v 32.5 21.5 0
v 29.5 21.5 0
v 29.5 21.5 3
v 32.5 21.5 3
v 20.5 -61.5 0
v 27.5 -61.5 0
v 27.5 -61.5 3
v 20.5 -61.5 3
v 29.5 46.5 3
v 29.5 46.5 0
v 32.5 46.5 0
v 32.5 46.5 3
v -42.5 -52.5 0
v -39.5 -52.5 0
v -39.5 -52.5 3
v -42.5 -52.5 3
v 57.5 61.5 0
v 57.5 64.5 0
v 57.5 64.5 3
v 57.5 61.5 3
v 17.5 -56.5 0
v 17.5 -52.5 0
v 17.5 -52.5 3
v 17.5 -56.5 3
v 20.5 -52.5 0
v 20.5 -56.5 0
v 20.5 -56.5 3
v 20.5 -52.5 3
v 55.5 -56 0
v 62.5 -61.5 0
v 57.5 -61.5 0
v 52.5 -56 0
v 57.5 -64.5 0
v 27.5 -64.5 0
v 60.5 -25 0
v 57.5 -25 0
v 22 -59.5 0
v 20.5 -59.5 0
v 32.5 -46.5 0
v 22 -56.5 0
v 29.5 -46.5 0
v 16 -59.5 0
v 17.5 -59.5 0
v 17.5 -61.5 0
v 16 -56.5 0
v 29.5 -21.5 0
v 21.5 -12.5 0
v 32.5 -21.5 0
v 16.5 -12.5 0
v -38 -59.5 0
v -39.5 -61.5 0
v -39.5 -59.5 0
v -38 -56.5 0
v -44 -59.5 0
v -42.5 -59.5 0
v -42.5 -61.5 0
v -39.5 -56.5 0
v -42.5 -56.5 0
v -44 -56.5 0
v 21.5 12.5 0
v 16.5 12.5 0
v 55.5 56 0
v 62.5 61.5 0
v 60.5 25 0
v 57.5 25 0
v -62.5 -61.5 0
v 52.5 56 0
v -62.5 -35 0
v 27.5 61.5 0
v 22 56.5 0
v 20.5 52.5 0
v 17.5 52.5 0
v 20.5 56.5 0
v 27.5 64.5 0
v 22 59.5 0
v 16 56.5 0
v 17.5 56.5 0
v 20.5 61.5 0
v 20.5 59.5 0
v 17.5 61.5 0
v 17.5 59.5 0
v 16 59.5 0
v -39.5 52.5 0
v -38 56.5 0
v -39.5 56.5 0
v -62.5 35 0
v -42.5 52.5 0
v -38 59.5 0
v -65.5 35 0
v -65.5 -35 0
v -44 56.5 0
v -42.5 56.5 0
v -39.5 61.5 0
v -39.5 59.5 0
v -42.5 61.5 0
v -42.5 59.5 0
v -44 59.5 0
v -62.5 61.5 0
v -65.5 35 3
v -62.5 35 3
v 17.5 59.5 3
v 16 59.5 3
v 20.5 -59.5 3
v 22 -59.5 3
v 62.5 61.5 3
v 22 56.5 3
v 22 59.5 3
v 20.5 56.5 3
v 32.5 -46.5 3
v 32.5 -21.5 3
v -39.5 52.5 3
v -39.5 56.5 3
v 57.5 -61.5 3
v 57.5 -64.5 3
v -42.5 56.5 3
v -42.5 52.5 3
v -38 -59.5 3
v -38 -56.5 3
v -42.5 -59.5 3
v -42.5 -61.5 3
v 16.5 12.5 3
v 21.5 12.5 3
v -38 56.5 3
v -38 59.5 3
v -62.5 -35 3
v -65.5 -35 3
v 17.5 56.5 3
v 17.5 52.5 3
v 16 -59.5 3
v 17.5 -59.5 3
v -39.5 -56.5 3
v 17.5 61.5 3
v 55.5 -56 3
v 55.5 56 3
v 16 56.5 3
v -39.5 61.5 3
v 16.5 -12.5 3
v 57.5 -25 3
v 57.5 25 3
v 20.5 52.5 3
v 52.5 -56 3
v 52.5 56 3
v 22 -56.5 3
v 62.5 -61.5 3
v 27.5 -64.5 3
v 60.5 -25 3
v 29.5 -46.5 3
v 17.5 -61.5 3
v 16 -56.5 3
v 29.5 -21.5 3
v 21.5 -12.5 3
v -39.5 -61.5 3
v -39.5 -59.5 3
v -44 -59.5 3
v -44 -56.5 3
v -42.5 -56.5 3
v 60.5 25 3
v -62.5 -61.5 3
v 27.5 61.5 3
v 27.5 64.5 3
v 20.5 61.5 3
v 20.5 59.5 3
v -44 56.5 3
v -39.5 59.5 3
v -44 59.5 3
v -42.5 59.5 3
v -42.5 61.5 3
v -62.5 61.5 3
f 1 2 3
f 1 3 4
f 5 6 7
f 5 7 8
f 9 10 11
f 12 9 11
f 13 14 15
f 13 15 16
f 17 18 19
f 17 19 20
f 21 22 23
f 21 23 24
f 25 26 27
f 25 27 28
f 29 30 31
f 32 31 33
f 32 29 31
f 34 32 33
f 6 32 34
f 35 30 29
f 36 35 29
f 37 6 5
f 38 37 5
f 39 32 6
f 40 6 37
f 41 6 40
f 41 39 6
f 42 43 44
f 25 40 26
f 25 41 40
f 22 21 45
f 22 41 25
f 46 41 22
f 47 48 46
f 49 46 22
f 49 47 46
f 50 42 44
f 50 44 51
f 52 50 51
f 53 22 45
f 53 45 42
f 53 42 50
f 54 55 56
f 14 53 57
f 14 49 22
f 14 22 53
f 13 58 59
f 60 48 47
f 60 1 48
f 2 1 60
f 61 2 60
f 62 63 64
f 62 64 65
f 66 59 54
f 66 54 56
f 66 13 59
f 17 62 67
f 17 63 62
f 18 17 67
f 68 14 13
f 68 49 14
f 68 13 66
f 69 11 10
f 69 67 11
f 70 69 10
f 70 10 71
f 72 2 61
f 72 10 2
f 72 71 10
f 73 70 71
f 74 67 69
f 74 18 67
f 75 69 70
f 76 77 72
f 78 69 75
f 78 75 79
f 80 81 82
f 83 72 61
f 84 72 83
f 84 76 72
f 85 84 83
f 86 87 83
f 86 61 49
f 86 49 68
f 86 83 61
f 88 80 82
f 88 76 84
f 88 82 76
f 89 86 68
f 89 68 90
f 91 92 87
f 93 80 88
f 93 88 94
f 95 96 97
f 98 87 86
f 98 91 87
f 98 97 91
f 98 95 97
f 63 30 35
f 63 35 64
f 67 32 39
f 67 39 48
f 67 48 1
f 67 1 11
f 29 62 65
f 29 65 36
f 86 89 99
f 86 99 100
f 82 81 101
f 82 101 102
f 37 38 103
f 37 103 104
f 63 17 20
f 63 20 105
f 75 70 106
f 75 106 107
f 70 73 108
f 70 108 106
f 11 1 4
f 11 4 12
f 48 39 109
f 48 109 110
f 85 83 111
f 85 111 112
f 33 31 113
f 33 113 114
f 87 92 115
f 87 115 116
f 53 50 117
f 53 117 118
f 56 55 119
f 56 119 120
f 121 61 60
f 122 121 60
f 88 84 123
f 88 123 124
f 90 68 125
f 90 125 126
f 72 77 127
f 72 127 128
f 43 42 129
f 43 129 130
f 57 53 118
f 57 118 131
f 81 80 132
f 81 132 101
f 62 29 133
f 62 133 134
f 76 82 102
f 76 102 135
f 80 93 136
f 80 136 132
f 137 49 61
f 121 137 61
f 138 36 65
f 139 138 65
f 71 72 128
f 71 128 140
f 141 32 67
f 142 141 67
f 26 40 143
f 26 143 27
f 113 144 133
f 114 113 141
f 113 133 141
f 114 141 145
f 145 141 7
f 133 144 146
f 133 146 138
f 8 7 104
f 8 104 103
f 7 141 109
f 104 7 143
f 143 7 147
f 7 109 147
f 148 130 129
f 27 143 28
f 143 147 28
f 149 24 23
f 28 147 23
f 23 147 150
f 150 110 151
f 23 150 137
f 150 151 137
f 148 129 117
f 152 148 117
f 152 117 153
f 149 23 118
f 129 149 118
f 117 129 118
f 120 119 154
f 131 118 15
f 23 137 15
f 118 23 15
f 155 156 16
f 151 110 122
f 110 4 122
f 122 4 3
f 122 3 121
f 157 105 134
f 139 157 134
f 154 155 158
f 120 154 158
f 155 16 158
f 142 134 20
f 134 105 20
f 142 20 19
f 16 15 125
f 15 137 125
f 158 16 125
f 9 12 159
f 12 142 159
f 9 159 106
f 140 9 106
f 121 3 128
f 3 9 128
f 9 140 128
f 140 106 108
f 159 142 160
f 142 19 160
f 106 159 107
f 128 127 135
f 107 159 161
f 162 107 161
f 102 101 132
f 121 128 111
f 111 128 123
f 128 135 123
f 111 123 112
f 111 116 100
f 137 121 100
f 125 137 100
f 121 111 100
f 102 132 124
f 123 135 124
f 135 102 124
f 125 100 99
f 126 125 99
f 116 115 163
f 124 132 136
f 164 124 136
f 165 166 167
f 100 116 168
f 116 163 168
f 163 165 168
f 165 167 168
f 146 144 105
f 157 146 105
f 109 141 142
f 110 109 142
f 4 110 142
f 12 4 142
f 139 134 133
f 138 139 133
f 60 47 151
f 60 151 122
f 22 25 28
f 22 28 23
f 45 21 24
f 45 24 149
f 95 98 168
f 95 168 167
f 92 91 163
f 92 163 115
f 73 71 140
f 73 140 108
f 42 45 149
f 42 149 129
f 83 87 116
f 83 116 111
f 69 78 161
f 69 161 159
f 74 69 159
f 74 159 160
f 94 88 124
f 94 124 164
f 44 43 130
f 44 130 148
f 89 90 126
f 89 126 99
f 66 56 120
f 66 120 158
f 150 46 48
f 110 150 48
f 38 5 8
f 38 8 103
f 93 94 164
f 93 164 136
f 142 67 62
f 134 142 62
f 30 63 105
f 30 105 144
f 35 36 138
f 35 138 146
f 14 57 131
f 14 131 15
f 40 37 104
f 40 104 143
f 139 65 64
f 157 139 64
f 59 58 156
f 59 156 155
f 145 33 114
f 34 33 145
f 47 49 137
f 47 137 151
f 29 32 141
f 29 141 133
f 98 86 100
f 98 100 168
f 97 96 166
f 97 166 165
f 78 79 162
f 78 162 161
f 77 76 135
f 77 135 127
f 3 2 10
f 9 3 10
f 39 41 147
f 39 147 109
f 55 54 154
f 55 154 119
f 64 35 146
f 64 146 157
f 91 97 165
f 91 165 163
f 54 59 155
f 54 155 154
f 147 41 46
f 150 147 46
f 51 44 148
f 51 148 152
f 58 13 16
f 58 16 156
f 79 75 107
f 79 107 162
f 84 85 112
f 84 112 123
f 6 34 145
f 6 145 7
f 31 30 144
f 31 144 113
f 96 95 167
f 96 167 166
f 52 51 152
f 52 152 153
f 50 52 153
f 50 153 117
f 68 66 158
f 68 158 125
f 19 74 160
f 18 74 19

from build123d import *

# Parameters (mm, degrees)
SKETCH1_W           = 5
SKETCH1_H           = 25
SKETCH1_W_2         = 3
SKETCH1_H_2         = 50
SKETCH1_H_3         = 112
BOSS_EXTRUDE2_DEPTH = 3


with BuildPart() as part:
    # Sketch1 → Boss-Extrude2 (new body)
    with BuildSketch(Plane.XY):
        Polygon((17.5, 52.5), (20.5, 52.5), (20.5, 56.5), (22, 56.5), (22, 59.5), (20.5, 59.5), (20.5, 61.5), (27.5, 61.5), (27.5, 64.5), (57.5, 64.5), (57.5, 61.5), (62.5, 61.5), (62.5, -61.5), (57.5, -61.5), (57.5, -64.5), (27.5, -64.5), (27.5, -61.5), (20.5, -61.5), (20.5, -59.5), (22, -59.5), (22, -56.5), (20.5, -56.5), (20.5, -52.5), (17.5, -52.5), (17.5, -56.5), (16, -56.5), (16, -59.5), (17.5, -59.5), (17.5, -61.5), (-39.5, -61.5), (-39.5, -59.5), (-38, -59.5), (-38, -56.5), (-39.5, -56.5), (-39.5, -52.5), (-42.5, -52.5), (-42.5, -56.5), (-44, -56.5), (-44, -59.5), (-42.5, -59.5), (-42.5, -61.5), (-62.5, -61.5), (-62.5, -35), (-65.5, -35), (-65.5, 35), (-62.5, 35), (-62.5, 61.5), (-42.5, 61.5), (-42.5, 59.5), (-44, 59.5), (-44, 56.5), (-42.5, 56.5), (-42.5, 52.5), (-39.5, 52.5), (-39.5, 56.5), (-38, 56.5), (-38, 59.5), (-39.5, 59.5), (-39.5, 61.5), (17.5, 61.5), (17.5, 59.5), (16, 59.5), (16, 56.5), (17.5, 56.5), align=None)
        with Locations((19, 0)):
            Rectangle(SKETCH1_W, SKETCH1_H, mode=Mode.SUBTRACT)
        with Locations((59, 0)):
            Rectangle(SKETCH1_W_2, SKETCH1_H_2, mode=Mode.SUBTRACT)
        with Locations((31, -34)):
            Rectangle(SKETCH1_W_2, SKETCH1_H, mode=Mode.SUBTRACT)
        with Locations((31, 34)):
            Rectangle(SKETCH1_W_2, SKETCH1_H, mode=Mode.SUBTRACT)
        with Locations((54, 0)):
            Rectangle(SKETCH1_W_2, SKETCH1_H_3, mode=Mode.SUBTRACT)
    extrude(amount=BOSS_EXTRUDE2_DEPTH)


solid = part.part
